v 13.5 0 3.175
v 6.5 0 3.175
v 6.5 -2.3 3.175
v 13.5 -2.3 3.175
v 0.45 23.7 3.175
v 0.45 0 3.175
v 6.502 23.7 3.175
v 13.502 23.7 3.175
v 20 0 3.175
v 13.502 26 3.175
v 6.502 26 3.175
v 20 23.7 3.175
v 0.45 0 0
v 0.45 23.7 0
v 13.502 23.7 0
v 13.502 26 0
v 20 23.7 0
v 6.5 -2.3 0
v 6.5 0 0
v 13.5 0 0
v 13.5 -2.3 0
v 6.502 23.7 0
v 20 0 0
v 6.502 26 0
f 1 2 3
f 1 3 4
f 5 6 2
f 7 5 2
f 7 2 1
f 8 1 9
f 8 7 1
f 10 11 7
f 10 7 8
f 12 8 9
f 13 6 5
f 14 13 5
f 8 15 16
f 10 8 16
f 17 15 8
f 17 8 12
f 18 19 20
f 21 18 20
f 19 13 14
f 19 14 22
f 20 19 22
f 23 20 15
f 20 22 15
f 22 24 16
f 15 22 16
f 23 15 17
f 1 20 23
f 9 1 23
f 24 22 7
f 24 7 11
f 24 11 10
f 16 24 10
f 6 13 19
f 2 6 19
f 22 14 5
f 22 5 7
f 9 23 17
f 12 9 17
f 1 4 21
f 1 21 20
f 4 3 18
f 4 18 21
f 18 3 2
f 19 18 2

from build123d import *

# Parameters (mm, degrees)
SKETCH1_W           = 20
SKETCH1_H           = 23.7
BOSS_EXTRUDE1_DEPTH = 3.175
SKETCH2_W           = 7
SKETCH2_H           = 2.3
BOSS_EXTRUDE2_DEPTH = 3.175
SKETCH3_W           = 0.45
SKETCH3_H           = 23.7
CUT_EXTRUDE1_DEPTH  = 10


with BuildPart() as part:
    # Sketch1 → Boss-Extrude1 (new body)
    with BuildSketch(Plane.XY):
        with Locations((10, 11.85)):
            Rectangle(SKETCH1_W, SKETCH1_H)
    extrude(amount=BOSS_EXTRUDE1_DEPTH)

    # Sketch2 → Boss-Extrude2 (add)
    with BuildSketch(Plane.XY.offset(3.175)):
        with Locations((10.002051165, 24.85)):
            Rectangle(SKETCH2_W, SKETCH2_H)
        with Locations((10, -1.15)):
            Rectangle(SKETCH2_W, SKETCH2_H)
    extrude(amount=-BOSS_EXTRUDE2_DEPTH)

    # Sketch3 → Cut-Extrude1 (cut)
    with BuildSketch(Plane.XY.offset(3.175)):
        with Locations((0.225, 11.85)):
            Rectangle(SKETCH3_W, SKETCH3_H)
    extrude(amount=-CUT_EXTRUDE1_DEPTH, mode=Mode.SUBTRACT)


solid = part.part
